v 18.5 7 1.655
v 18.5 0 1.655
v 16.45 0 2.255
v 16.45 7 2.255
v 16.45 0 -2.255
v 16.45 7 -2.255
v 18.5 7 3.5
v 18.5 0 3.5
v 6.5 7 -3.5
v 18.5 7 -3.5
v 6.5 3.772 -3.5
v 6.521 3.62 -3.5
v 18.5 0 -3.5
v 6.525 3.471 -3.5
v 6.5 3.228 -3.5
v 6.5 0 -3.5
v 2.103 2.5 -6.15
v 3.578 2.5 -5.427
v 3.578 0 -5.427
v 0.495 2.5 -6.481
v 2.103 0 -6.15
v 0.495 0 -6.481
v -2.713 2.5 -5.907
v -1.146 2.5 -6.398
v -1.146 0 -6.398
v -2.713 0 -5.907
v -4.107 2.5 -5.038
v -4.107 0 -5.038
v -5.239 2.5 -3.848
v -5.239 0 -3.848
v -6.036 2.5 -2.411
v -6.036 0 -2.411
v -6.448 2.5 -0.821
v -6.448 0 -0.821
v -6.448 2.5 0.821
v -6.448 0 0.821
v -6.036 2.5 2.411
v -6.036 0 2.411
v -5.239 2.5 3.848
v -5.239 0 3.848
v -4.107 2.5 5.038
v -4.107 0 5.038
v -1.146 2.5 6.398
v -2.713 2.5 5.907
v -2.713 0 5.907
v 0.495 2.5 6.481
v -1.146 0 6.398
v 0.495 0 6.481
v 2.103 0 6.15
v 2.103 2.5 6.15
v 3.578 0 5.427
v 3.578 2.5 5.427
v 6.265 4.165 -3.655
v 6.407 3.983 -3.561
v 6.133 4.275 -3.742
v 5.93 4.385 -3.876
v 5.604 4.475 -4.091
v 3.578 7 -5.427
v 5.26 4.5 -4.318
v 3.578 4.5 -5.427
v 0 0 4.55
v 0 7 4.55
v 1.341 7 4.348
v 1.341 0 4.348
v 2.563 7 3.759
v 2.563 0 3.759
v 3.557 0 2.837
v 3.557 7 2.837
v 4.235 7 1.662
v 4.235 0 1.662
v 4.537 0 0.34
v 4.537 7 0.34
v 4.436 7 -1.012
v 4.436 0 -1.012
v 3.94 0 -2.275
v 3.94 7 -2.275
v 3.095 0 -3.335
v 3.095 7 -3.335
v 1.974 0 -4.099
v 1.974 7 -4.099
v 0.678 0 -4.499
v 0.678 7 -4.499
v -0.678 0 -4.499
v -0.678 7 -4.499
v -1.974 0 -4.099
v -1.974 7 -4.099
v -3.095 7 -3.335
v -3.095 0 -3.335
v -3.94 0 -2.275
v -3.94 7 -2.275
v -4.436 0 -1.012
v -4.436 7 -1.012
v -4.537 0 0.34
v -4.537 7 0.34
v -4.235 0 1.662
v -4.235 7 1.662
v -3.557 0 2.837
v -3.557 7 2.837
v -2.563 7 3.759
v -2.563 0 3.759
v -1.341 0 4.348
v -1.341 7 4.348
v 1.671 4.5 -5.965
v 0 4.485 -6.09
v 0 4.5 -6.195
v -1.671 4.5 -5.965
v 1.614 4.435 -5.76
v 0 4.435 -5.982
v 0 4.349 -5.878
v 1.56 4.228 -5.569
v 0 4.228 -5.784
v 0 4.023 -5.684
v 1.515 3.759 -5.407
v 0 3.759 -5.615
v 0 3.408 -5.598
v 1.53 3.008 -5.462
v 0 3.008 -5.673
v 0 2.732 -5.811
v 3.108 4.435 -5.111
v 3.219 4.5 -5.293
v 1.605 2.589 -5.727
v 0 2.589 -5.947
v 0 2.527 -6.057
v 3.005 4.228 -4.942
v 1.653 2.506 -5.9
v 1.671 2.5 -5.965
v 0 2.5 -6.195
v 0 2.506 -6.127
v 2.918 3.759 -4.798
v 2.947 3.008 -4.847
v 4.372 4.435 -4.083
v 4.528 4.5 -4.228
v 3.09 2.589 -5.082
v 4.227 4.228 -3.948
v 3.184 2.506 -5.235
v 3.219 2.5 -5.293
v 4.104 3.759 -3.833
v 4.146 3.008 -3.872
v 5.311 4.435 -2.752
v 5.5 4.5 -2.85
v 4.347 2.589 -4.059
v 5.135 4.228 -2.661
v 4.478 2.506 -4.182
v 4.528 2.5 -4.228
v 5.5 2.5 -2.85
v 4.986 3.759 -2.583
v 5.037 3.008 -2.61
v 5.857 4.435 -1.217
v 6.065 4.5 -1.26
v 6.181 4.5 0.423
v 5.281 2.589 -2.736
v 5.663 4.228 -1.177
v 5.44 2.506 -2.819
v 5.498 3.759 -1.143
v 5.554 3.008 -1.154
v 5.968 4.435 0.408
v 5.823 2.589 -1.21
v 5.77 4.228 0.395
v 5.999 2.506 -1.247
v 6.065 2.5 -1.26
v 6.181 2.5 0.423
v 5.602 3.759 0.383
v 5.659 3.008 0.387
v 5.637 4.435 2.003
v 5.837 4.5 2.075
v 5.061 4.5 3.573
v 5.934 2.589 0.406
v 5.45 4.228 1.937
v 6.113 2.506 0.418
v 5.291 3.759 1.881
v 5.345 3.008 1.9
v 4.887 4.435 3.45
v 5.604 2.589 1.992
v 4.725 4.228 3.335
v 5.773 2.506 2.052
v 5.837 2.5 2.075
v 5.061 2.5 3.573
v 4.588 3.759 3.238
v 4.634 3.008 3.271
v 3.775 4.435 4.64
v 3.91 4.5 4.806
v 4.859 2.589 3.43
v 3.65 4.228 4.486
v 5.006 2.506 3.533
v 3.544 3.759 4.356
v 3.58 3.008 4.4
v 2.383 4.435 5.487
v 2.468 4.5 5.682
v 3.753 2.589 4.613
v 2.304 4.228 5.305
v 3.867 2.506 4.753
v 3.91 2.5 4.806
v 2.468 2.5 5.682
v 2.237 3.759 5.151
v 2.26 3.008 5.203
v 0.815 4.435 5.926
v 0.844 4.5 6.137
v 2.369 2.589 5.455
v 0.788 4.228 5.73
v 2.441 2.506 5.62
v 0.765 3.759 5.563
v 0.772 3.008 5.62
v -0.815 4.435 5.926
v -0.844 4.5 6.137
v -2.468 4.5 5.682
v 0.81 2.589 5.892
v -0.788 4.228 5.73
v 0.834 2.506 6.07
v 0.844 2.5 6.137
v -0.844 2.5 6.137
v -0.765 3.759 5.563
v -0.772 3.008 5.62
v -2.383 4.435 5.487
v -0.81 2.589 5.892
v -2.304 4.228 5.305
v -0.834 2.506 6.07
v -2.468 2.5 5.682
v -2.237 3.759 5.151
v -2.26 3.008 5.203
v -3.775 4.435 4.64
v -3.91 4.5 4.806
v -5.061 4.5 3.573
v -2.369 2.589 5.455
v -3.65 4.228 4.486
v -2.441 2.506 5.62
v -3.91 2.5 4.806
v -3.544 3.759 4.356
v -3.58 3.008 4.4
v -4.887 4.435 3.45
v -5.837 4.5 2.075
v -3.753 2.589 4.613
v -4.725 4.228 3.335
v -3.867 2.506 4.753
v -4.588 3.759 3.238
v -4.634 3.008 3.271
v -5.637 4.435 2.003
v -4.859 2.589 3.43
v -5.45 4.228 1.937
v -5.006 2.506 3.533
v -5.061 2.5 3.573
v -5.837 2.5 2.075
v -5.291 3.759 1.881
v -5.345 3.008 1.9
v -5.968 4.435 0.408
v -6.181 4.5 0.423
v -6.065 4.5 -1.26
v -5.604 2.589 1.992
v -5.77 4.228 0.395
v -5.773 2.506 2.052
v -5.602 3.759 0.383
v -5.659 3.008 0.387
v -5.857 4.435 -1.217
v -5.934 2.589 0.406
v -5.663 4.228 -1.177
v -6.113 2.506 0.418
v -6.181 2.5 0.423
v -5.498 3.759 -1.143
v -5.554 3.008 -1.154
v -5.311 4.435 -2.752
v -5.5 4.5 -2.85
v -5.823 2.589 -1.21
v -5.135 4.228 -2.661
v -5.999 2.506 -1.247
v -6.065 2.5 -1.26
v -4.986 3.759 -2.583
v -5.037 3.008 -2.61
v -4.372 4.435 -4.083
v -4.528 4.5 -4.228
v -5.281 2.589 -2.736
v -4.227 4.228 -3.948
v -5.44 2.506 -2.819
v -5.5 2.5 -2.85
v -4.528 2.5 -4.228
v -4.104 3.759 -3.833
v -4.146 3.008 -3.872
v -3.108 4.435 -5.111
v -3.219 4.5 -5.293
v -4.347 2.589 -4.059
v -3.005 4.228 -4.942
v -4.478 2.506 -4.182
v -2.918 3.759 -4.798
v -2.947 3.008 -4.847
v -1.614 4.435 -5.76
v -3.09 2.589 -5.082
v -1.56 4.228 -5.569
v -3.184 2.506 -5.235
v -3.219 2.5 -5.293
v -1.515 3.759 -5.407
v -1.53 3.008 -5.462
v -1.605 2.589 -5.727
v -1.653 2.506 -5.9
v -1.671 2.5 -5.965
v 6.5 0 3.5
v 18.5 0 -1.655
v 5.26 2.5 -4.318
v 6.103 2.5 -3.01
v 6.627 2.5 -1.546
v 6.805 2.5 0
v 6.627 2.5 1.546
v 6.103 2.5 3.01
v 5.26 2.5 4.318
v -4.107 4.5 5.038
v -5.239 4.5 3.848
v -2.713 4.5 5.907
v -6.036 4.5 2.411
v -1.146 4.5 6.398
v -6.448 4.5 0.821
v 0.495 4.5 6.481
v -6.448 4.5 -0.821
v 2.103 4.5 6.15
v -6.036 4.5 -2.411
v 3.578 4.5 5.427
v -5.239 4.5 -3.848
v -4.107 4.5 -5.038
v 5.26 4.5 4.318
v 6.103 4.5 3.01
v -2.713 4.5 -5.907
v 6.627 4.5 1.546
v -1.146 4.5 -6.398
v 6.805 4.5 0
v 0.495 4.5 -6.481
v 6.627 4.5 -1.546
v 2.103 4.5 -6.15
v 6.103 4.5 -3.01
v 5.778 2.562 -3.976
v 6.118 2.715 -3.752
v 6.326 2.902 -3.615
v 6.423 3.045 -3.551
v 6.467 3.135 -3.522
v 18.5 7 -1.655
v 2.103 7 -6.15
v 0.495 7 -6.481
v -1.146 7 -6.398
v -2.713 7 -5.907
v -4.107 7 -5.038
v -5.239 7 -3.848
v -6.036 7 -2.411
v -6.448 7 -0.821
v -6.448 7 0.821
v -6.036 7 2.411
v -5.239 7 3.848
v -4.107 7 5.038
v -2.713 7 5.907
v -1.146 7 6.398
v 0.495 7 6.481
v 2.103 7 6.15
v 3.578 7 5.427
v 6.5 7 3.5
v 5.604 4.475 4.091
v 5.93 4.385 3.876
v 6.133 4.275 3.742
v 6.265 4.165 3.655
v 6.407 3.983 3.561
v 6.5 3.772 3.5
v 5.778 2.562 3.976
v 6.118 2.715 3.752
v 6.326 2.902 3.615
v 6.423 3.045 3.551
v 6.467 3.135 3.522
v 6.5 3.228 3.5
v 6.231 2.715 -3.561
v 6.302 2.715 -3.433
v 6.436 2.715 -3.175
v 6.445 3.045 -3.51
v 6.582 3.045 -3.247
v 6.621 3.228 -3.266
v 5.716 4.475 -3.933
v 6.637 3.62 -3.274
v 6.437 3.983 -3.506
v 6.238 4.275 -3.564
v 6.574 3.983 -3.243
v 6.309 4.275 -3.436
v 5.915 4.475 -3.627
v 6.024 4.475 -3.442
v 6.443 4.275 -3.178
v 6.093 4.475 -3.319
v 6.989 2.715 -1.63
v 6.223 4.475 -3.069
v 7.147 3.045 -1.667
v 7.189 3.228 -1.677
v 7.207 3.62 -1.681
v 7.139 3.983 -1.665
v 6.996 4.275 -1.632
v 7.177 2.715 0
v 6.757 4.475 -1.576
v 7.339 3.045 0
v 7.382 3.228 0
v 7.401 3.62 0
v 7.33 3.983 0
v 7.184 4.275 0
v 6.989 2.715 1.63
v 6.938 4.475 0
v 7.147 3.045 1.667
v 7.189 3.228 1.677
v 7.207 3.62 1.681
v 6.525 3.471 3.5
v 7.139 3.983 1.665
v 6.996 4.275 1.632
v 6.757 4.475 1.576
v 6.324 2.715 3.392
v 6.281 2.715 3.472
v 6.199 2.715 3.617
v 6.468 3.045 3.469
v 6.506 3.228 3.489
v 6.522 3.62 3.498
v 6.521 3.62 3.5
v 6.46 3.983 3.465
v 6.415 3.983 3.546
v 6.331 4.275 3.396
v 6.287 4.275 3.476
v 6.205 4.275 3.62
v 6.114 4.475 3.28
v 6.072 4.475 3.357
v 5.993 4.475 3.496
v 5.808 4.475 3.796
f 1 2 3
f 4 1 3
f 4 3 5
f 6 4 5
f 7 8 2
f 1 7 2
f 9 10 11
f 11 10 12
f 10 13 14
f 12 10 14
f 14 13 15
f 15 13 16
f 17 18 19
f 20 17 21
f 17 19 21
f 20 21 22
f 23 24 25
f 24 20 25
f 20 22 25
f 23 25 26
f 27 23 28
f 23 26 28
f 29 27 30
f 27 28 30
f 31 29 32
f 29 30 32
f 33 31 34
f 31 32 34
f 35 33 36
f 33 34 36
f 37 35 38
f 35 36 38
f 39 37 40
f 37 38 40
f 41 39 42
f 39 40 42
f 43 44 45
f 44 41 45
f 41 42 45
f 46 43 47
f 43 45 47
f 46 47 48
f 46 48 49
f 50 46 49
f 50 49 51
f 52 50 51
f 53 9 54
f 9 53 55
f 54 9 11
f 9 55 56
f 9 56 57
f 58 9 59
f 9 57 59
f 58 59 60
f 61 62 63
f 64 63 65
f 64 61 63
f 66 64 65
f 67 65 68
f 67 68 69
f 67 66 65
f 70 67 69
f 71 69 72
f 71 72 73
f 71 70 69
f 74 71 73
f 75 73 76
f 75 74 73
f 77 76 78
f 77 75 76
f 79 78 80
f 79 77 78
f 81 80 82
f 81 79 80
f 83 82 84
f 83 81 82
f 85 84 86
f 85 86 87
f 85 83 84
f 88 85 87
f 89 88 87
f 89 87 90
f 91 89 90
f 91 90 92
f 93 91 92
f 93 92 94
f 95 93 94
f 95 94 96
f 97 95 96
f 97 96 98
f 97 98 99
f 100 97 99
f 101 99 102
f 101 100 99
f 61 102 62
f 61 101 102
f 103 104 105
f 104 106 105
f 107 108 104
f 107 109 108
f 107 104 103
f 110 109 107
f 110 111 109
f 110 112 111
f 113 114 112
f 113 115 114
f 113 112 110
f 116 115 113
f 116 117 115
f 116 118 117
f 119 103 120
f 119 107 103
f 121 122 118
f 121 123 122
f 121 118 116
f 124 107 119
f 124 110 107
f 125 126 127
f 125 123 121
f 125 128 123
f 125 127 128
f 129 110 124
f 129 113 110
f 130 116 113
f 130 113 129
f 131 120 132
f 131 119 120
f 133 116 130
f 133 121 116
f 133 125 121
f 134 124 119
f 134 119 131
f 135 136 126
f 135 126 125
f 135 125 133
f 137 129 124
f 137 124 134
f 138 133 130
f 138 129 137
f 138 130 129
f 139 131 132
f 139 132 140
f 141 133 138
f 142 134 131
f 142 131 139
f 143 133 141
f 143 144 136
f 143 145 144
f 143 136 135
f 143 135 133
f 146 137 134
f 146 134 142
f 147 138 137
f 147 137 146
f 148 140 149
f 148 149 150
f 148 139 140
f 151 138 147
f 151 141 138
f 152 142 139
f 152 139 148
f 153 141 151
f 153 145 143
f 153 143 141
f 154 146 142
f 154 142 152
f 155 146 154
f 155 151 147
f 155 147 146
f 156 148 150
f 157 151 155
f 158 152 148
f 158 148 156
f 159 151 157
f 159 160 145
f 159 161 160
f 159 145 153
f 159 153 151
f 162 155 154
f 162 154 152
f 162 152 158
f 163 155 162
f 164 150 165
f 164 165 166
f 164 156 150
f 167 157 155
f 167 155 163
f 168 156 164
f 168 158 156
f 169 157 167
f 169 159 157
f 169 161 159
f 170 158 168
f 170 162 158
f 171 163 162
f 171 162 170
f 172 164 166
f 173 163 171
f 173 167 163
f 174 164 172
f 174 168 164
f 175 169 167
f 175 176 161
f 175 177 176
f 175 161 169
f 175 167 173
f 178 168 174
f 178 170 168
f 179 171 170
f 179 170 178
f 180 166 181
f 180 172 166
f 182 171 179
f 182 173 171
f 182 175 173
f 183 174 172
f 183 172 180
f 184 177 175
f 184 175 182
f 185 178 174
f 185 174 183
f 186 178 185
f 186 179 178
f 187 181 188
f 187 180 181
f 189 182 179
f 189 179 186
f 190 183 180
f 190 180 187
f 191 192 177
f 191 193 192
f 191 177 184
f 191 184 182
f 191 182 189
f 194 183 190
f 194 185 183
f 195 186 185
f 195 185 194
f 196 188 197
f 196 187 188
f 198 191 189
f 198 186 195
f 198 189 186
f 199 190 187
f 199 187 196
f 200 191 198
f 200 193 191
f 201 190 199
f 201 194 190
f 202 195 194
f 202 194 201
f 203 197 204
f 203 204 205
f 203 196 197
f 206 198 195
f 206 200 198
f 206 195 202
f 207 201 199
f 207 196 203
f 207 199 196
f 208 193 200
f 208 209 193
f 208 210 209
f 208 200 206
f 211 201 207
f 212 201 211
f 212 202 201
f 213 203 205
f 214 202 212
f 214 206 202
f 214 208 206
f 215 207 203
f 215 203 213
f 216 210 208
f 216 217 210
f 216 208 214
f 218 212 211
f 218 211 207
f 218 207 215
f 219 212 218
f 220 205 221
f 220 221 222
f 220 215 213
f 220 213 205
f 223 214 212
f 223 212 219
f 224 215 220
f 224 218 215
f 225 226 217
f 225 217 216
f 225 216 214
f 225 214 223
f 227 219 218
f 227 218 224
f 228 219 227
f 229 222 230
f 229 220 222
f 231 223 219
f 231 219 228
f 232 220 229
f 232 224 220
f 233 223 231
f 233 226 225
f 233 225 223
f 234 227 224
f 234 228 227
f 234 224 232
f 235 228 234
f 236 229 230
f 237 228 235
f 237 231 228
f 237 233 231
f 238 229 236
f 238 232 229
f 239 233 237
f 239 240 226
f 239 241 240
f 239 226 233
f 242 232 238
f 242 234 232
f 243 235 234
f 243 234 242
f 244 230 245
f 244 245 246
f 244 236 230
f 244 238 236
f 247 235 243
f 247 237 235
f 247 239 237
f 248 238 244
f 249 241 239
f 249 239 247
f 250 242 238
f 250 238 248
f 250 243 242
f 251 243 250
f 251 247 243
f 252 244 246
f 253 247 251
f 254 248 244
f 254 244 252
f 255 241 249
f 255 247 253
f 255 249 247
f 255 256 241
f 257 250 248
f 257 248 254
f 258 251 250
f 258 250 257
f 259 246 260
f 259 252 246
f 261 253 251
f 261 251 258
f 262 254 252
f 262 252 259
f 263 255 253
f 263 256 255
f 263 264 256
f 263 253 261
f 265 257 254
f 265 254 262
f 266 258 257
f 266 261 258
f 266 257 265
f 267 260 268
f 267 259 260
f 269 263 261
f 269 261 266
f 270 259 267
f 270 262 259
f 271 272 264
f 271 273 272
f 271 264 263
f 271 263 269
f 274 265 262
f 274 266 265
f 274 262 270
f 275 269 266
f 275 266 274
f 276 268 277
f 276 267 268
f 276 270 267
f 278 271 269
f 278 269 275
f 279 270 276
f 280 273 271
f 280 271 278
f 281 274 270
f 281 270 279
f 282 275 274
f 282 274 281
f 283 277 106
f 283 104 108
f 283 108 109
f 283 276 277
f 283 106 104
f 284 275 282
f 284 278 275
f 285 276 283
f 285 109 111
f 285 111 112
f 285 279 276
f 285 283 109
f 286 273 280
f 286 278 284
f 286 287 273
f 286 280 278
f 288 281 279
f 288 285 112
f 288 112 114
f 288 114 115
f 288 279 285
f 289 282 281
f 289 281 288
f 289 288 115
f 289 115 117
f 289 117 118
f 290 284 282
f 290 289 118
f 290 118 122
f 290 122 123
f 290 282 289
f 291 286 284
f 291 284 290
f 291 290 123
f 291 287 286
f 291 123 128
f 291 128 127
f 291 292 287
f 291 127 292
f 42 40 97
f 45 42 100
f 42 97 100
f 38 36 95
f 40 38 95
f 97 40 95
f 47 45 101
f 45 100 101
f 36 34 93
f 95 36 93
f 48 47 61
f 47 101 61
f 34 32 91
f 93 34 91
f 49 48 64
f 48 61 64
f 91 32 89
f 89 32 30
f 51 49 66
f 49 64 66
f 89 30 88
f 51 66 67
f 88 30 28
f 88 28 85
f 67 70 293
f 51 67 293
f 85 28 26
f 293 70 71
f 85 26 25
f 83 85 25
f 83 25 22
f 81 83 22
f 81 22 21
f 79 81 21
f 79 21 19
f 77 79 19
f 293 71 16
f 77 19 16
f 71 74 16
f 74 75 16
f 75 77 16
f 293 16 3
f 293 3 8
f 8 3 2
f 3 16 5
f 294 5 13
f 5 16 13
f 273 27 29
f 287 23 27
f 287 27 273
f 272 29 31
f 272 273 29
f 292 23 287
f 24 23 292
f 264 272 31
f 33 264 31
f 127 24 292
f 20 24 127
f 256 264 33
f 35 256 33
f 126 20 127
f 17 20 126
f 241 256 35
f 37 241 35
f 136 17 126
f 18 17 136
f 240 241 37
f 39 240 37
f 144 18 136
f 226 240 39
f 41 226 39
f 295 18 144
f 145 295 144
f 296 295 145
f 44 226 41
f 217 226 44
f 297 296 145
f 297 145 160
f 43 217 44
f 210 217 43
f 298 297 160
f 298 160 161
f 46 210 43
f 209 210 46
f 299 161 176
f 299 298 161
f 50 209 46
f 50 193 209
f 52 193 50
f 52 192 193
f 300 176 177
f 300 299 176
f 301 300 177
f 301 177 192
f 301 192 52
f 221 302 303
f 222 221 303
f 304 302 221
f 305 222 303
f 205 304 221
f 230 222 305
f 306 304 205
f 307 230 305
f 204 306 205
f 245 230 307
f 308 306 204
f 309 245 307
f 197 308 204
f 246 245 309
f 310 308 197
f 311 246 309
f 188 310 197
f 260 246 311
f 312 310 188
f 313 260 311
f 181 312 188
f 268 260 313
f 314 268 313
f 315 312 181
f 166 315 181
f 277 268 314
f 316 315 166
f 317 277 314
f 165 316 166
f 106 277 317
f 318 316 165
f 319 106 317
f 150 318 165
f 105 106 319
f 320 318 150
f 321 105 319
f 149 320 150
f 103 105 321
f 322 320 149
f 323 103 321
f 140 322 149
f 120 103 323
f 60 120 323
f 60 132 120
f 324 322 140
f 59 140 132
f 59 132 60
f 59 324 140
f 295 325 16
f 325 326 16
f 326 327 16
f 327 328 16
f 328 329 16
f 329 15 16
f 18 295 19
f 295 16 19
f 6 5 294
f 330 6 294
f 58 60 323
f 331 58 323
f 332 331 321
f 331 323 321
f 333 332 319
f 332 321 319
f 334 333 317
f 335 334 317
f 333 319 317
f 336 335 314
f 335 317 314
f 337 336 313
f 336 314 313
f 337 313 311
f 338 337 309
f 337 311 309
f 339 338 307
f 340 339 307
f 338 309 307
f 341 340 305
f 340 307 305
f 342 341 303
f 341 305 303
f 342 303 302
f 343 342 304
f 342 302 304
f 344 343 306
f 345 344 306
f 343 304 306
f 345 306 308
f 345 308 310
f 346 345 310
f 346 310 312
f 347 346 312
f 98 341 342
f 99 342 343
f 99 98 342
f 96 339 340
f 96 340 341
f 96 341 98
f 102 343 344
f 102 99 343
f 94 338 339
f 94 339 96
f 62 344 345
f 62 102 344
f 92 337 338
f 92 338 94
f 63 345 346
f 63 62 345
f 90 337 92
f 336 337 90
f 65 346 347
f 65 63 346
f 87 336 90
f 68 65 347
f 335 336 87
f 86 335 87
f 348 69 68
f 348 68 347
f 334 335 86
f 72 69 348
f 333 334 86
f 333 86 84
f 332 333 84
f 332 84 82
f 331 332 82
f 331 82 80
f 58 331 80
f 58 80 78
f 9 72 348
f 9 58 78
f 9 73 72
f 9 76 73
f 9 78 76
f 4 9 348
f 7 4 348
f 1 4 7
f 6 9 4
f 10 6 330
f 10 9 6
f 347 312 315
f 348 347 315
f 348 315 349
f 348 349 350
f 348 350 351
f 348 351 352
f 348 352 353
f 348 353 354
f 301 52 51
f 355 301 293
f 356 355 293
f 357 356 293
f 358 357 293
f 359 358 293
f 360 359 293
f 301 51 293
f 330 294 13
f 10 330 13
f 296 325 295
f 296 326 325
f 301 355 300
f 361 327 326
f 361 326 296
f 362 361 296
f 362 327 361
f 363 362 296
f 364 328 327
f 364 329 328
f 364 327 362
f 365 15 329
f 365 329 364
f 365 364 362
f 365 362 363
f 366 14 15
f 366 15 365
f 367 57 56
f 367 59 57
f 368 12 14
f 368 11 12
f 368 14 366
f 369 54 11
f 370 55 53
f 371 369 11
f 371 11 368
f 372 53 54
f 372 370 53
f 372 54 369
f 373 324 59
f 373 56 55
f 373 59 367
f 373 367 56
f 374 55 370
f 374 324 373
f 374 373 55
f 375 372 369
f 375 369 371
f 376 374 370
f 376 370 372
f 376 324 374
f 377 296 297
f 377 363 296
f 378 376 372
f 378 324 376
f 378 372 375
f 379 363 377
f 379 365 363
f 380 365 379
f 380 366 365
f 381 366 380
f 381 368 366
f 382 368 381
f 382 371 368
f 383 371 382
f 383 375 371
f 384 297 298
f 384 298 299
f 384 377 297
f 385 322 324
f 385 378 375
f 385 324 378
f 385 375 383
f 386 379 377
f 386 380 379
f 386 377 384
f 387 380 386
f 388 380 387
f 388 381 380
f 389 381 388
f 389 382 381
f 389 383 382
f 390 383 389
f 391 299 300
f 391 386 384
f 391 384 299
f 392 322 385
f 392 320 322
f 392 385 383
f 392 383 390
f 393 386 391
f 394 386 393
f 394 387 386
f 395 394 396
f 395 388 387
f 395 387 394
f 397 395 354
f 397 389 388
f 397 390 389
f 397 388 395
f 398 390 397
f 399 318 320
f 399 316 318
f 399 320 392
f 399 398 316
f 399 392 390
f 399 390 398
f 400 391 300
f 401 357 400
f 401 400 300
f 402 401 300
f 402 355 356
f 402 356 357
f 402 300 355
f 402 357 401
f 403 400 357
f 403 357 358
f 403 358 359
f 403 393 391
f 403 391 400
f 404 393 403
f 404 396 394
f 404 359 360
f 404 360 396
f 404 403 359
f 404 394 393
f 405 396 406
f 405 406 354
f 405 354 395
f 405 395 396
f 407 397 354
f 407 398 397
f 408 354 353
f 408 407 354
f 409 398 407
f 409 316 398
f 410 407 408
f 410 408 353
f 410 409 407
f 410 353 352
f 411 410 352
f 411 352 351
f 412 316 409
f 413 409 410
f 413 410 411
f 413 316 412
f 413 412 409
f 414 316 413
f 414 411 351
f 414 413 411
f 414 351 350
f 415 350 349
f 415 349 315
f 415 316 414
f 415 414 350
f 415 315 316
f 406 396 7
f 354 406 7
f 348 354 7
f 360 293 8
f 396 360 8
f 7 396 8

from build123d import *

# Parameters (mm, degrees)
SKETCH1_R           = 4.55
BOSS_EXTRUDE2_DEPTH = 7


with BuildPart() as part:
    # Sketch1 → Boss-Extrude2 (new body)
    with BuildSketch(Plane(origin=(0, 0, 0), x_dir=(1, 0, 0), z_dir=(0, 1, 0))):
        with BuildLine():
            Line((6.5, 3.5), (3.577981651, 5.426605505))
            ThreePointArc((3.577981651, 5.426605505), (-6.5, 0), (3.577981651, -5.426605505))
            Line((3.577981651, -5.426605505), (6.5, -3.5))
            Line((6.5, -3.5), (18.5, -3.5))
            Line((18.5, -3.5), (18.5, -1.655))
            Line((18.5, -1.655), (16.45, -2.255))
            Line((16.45, -2.255), (16.45, 2.255))
            Line((16.45, 2.255), (18.5, 1.655))
            Line((18.5, 1.655), (18.5, 3.5))
            Line((18.5, 3.5), (6.5, 3.5))
        make_face()
        with Locations(Location((0, 0, 0), (0, 0, 270))):
            Circle(SKETCH1_R, mode=Mode.SUBTRACT)
    extrude(amount=BOSS_EXTRUDE2_DEPTH)

    # Sketch2 → Cut-Revolve1 (revolve, cut)
    with BuildSketch(Plane(origin=(0, 0, 0), x_dir=(0, -1, 0), z_dir=(1, 0, 0))):
        with BuildLine():
            Line((-4.5, 6.805), (-4.5, 6.195))
            add(Edge.make_bspline(
                [(-4.5, 6.195), (-4.5, 5.595), (-3.5, 5.595), (-2.5, 5.595), (-2.5, 6.195)],
                knots=[0, 0, 0, 1.570796327, 1.570796327, 3.141592654, 3.141592654, 3.141592654], degree=2, weights=[1, 0.707106781, 1, 0.707106781, 1]))
            Line((-2.5, 6.195), (-2.5, 6.805))
            add(Edge.make_bspline(
                [(-2.5, 6.805), (-2.499999858, 7.405000085), (-3.5, 7.405000085), (-4.500000142, 7.405000085), (-4.5, 6.805)],
                knots=[3.141592512, 3.141592512, 3.141592512, 4.71238898, 4.71238898, 6.283185449, 6.283185449, 6.283185449], degree=2, weights=[1, 0.707106731, 1, 0.707106731, 1]))
        make_face()
    revolve(axis=Axis((0, 7.335318457, 0), (0, -1, 0)), mode=Mode.SUBTRACT)


solid = part.part
